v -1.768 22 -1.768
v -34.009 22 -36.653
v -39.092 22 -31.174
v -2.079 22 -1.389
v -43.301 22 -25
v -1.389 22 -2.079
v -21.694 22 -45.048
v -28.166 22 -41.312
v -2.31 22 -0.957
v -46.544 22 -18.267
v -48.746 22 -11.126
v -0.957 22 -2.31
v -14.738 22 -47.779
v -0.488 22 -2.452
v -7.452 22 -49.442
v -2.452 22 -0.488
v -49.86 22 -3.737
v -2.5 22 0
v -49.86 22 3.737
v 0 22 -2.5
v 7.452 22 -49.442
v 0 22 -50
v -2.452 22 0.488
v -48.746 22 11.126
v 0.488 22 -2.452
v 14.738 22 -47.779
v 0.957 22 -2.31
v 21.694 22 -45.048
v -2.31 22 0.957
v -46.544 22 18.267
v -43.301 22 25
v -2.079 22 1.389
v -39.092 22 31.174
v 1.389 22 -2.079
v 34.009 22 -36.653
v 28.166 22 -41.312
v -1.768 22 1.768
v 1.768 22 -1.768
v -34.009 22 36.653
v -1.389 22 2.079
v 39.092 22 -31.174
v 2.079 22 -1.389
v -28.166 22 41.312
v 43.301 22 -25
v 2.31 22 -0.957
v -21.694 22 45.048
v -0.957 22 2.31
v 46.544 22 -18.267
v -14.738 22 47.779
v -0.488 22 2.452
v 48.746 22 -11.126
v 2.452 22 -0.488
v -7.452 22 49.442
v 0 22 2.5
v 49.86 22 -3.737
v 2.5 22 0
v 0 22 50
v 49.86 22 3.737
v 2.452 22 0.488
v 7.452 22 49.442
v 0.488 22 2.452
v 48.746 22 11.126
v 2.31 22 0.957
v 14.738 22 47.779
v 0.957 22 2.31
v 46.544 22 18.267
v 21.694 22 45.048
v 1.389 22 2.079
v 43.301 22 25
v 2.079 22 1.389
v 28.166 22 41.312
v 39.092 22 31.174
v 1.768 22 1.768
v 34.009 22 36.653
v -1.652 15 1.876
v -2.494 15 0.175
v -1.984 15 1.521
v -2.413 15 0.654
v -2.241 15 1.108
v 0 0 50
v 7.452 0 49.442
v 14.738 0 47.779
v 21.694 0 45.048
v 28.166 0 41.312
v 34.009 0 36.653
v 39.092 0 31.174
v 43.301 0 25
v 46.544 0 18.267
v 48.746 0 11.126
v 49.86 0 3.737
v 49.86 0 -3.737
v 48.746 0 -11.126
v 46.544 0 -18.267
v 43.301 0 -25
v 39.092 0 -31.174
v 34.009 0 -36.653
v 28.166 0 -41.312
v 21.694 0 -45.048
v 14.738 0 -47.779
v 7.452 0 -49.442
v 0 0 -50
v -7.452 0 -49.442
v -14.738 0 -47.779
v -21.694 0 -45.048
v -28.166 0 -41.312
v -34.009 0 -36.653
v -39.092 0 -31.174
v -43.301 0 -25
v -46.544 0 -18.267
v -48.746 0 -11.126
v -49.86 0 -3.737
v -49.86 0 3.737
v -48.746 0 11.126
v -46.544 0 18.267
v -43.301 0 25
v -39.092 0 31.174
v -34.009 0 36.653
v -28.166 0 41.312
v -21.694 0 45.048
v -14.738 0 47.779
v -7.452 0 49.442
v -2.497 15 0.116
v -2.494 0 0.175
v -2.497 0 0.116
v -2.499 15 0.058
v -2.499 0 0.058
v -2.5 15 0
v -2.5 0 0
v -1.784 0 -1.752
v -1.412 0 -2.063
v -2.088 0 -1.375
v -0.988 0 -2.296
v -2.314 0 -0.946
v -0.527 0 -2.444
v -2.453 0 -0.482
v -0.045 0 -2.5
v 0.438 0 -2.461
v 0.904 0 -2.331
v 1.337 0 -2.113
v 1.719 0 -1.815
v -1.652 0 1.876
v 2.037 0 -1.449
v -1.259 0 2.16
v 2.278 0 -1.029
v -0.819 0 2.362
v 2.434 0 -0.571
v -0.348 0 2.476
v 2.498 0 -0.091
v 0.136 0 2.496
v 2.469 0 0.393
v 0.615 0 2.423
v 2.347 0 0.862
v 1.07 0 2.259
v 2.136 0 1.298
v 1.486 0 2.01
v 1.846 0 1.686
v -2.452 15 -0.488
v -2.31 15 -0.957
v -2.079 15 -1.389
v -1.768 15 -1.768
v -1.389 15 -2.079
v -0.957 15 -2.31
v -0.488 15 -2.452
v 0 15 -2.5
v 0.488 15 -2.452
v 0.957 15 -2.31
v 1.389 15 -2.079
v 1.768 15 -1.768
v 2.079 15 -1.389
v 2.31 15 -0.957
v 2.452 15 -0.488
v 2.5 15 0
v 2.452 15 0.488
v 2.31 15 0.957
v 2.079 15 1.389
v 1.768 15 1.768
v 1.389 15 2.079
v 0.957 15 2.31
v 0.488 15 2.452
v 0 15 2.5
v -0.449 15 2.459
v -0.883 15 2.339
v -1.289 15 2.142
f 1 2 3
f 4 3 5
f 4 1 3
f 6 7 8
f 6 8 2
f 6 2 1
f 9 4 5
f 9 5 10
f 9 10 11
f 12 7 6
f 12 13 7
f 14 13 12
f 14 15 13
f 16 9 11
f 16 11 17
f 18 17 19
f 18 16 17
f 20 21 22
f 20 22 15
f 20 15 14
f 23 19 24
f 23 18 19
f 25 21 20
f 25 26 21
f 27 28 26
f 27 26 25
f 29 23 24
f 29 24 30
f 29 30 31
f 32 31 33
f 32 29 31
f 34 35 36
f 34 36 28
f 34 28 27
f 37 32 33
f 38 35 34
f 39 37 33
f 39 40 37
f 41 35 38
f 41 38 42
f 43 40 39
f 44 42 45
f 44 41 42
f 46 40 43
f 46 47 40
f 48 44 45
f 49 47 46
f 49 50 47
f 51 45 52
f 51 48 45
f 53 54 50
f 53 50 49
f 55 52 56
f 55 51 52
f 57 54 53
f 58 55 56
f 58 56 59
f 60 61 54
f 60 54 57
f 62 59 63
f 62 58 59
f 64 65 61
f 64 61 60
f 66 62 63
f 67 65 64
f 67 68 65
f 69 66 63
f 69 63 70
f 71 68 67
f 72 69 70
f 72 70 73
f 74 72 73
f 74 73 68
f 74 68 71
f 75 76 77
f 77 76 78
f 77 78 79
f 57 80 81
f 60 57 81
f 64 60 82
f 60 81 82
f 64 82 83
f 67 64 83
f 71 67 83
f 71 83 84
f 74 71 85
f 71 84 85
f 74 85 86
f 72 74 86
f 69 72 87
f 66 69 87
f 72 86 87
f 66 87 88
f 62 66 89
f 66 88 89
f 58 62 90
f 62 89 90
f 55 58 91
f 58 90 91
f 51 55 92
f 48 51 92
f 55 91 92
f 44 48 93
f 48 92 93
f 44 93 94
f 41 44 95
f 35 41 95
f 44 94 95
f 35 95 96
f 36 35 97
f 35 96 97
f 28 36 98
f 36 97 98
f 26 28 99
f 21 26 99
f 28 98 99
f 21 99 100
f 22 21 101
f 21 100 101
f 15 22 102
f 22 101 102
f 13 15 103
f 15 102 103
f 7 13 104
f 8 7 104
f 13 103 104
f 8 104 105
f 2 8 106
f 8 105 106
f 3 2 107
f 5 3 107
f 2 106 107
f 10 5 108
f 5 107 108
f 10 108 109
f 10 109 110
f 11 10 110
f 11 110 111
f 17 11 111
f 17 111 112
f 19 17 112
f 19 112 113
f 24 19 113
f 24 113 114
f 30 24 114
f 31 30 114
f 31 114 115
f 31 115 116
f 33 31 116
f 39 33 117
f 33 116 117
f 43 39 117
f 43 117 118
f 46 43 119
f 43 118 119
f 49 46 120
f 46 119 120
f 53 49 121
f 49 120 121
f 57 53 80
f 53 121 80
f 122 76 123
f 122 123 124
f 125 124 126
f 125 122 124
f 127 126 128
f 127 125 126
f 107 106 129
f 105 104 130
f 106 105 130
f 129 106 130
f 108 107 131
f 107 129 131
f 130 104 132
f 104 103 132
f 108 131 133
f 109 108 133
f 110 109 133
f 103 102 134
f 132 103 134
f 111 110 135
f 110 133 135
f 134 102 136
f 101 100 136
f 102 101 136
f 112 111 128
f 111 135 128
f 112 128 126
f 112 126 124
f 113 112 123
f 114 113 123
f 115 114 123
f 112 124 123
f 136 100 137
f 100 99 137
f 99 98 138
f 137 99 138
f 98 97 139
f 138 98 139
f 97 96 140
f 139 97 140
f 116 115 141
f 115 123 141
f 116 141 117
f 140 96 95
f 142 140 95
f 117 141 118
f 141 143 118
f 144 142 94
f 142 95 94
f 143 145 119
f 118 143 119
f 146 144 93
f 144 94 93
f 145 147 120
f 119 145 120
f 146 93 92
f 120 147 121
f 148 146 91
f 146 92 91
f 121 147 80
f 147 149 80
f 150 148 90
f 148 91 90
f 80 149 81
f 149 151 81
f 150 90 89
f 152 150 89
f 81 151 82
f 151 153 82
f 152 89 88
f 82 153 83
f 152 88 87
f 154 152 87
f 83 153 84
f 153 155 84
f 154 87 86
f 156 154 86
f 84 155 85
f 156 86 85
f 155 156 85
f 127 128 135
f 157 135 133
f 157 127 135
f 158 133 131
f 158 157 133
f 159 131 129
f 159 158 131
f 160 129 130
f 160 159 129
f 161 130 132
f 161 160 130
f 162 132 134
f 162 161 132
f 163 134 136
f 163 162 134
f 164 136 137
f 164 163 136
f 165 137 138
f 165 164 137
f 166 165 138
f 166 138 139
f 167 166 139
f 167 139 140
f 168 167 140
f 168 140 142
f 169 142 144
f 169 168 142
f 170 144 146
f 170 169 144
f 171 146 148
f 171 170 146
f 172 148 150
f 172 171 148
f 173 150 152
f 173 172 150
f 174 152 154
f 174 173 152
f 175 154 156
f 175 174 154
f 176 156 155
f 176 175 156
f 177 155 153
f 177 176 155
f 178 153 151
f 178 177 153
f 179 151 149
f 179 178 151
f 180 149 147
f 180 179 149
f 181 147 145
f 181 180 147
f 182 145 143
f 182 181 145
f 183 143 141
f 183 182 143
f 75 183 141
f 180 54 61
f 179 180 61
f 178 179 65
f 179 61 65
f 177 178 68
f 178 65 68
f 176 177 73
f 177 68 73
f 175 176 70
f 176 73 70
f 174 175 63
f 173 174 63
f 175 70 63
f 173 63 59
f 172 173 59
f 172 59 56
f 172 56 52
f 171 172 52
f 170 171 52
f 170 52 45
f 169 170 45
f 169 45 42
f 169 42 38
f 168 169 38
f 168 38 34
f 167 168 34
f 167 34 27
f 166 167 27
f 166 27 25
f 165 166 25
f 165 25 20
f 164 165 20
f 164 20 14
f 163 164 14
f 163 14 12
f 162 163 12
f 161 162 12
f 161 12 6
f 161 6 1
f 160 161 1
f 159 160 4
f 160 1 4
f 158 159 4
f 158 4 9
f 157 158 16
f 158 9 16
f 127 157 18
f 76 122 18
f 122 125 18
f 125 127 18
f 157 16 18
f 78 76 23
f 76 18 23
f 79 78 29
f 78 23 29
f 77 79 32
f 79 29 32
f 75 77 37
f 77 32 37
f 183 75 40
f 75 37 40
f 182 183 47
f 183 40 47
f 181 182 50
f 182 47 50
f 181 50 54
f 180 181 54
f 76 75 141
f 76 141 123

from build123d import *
from build123d.topology import SkipClean

# Parameters (mm, degrees)
ESQUISSE1_R             = 50
BOSS_EXTRU_1_DEPTH      = 22
ESQUISSE4_R             = 2.5
ENL_V_MAT_EXTRU_1_DEPTH = 7
ENL_V_START             = -15
ENL_V_MAT_EXTRU_2_DEPTH = 15


with BuildPart() as part:
    # Esquisse1 → Boss.-Extru.1 (new body)
    with BuildSketch(Plane(origin=(0, 0, 0), x_dir=(1, 0, 0), z_dir=(0, 1, 0))):
        with Locations(Location((0, 0, 0), (0, 0, 270))):
            Circle(ESQUISSE1_R)
    extrude(amount=BOSS_EXTRU_1_DEPTH)

    # Esquisse4 → Enlèv. mat.-Extru.1 (cut)
    with BuildSketch(Plane(origin=(0, 22, 0), x_dir=(1, 0, 0), z_dir=(0, 1, 0))):
        with Locations(Location((0, 0, 0), (0, 0, 270))):
            Circle(ESQUISSE4_R)
    extrude(amount=-ENL_V_MAT_EXTRU_1_DEPTH, mode=Mode.SUBTRACT)

    # Esquisse5 → Enlèv. mat.-Extru.2 (cut)
    with SkipClean():  # the faces are left unmerged after this step: merging them gives an invalid solid
        with BuildSketch(Plane(origin=(0, 0, 0), x_dir=(-1, 0, 0), z_dir=(0, -1, 0)).offset(ENL_V_START)):
            with BuildLine():
                ThreePointArc((2.5, 0), (-2.278226738, 1.02940902), (1.652253656, -1.876181723))
                Line((1.652253656, -1.876181723), (2.493901331, -0.174516908))
                ThreePointArc((2.493901331, -0.174516908), (2.498474868, -0.087311719), (2.5, 0))
            make_face()
        extrude(amount=ENL_V_MAT_EXTRU_2_DEPTH, mode=Mode.SUBTRACT)


solid = part.part
